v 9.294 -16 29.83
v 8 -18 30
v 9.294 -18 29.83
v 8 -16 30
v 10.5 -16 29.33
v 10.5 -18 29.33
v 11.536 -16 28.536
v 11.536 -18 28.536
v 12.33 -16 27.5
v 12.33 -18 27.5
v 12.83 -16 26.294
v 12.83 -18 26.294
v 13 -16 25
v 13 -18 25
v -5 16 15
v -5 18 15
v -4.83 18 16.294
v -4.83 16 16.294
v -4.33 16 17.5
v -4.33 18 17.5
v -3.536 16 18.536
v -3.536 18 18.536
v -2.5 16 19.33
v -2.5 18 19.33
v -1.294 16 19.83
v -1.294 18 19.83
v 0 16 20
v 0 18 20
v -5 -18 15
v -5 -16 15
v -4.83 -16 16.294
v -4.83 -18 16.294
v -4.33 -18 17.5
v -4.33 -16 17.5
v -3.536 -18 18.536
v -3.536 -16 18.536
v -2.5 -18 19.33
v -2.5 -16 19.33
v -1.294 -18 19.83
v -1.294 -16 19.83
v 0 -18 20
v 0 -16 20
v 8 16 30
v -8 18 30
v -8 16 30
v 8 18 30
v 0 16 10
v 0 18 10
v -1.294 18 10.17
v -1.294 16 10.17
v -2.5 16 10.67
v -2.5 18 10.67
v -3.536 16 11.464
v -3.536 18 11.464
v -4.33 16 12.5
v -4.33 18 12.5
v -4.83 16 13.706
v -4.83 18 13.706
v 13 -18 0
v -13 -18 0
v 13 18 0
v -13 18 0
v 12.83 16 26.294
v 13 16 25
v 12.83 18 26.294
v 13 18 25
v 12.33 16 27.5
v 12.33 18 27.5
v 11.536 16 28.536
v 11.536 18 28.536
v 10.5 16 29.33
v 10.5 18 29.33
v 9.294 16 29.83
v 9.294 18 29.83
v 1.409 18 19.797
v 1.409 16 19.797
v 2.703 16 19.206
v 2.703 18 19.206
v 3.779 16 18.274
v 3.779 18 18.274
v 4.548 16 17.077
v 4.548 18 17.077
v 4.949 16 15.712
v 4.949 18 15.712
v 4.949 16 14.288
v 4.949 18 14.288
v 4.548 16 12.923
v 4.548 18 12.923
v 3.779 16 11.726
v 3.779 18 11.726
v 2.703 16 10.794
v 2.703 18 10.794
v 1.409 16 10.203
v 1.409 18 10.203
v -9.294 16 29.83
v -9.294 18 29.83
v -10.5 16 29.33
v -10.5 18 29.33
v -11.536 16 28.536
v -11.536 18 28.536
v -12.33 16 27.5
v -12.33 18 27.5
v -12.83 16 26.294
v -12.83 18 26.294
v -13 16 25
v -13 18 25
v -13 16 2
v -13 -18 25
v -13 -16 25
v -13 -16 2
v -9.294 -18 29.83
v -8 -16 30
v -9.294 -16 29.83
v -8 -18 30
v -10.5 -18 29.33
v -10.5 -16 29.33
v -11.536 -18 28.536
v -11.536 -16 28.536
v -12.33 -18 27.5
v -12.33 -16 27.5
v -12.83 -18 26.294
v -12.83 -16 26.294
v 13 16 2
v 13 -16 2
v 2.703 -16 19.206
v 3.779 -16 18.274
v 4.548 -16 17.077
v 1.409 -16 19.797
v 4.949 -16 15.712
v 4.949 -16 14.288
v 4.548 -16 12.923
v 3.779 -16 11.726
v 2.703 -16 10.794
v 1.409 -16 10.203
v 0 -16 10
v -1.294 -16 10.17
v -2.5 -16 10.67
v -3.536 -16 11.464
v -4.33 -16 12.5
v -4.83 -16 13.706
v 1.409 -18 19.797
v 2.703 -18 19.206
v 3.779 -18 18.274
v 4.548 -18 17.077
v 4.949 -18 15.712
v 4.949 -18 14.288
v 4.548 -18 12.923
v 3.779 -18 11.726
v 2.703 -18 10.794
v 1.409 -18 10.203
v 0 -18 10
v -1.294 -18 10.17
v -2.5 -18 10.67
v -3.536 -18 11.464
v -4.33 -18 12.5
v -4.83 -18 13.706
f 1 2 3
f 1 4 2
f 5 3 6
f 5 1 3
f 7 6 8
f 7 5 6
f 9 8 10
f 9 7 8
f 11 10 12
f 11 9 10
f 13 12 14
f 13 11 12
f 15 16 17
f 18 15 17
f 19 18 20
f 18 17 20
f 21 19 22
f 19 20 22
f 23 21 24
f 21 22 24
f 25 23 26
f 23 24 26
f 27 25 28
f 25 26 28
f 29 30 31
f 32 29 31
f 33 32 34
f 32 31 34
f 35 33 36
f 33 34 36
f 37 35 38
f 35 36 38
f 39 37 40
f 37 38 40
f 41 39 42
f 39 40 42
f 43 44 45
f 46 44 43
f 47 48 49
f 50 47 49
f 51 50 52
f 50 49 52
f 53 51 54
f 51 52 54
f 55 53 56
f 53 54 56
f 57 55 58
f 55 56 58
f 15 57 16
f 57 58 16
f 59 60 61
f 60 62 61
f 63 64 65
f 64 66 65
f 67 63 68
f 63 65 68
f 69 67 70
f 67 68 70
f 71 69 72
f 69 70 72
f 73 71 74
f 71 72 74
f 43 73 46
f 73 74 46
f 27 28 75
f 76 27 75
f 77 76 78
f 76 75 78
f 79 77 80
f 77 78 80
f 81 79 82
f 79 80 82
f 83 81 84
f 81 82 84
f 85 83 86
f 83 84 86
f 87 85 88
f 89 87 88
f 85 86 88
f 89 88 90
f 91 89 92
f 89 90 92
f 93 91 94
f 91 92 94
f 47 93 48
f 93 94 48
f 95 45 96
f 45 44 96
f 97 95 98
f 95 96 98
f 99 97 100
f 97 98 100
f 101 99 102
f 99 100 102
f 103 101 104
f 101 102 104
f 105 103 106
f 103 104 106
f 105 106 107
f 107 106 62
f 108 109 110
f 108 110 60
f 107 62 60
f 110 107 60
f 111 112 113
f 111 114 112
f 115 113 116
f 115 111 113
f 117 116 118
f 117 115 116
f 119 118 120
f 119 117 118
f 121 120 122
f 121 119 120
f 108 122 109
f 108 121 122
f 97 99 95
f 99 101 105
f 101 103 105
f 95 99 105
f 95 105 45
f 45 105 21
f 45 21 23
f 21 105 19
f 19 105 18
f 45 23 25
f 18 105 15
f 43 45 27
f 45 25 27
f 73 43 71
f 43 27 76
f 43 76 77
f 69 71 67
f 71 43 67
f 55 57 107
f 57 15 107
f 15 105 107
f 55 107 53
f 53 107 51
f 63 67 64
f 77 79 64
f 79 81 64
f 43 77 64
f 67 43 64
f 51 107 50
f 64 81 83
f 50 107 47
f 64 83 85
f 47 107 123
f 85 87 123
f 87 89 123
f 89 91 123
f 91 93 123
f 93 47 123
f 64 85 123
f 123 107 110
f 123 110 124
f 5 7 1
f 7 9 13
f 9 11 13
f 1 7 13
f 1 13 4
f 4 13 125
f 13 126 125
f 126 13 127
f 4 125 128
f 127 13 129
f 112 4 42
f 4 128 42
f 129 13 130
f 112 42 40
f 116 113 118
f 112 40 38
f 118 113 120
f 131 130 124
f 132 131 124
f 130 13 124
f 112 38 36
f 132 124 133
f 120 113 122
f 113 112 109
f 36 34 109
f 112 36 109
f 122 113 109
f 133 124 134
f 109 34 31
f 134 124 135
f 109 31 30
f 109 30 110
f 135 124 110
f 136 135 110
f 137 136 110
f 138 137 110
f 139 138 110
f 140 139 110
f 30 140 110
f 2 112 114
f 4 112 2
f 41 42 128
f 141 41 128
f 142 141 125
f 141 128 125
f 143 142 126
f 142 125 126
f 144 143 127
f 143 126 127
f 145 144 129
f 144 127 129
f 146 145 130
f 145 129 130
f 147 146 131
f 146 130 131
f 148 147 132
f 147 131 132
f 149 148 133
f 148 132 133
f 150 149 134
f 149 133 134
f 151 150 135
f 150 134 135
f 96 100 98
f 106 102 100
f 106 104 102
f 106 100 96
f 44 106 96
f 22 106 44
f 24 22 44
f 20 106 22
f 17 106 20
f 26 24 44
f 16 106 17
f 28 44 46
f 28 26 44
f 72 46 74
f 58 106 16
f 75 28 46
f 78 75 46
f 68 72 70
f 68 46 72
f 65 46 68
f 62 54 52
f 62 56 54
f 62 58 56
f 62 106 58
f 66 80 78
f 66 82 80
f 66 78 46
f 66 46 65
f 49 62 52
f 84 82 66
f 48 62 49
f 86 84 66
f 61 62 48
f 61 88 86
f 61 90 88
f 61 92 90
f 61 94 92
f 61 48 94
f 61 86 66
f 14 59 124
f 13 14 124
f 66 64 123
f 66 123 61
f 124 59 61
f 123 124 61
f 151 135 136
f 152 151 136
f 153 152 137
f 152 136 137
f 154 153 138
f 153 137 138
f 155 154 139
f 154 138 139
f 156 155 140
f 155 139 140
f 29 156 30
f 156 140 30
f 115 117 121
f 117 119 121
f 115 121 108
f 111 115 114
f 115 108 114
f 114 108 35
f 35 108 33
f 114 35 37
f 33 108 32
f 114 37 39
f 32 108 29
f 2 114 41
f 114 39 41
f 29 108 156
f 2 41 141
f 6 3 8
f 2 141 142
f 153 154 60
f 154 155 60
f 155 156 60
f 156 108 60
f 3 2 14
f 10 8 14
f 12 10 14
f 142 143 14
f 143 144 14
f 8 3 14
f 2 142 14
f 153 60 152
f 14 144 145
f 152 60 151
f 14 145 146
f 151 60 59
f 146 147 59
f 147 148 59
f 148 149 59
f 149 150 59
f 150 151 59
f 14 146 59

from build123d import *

# Parameters (mm, degrees)
F0_W     = 26
F0_H     = 2
F1_DEPTH = 30
F0_H_2   = 34
F2_DEPTH = 2
F4_DEPTH = 28
F5_R     = 5
F6_R     = 5
F9_DEPTH = 100


# Not quite as in the source:
# - a feature of the source that left no trace in its solid (it failed there, or was rolled back) is left out


with BuildPart() as f1:
    # F0 (on Top) → F1 (new body)
    with BuildSketch(Plane.XY):
        with Locations((0, 17)):
            Rectangle(F0_W, F0_H)
    extrude(amount=F1_DEPTH)

    # F0 (on Top) → F2 (join)
    with BuildSketch(Plane.XY):
        with Locations((0, -1)):
            Rectangle(F0_W, F0_H_2)
    extrude(amount=F2_DEPTH)

    # F3 (on face) → F4 (join)
    with BuildSketch(Plane.XY.offset(2)):
        Polygon((13, -16), (0, -16), (-13, -16), (-13, -18), (13, -18), align=None)
    extrude(amount=F4_DEPTH)

    # F5
    f5_edges = [f1.edges().sort_by_distance(p)[0] for p in [
        (-13, 17, 30),
        (-13, -17, 30),
    ]]
    fillet(f5_edges, radius=F5_R)

    # F6
    f6_edges = [f1.edges().sort_by_distance(p)[0] for p in [
        (13, 17, 30),
        (13, -17, 30),
    ]]
    fillet(f6_edges, radius=F6_R)

    # F8 (on face) → F9 (cut)
    with BuildSketch(Plane(origin=(0, 18, 0), x_dir=(-1, 0, 0), z_dir=(0, 1, 0))):
        with BuildLine():
            ThreePointArc((5, 15), (3.5355339059, 18.5355339059), (0, 20))
            Line((0, 20), (0, 10))
            ThreePointArc((0, 10), (3.5355339059, 11.4644660941), (5, 15))
        make_face()
        with BuildLine():
            Line((0, 10), (0, 20))
            ThreePointArc((0, 20), (-5, 15), (0, 10))
        make_face()
    extrude(amount=-F9_DEPTH, mode=Mode.SUBTRACT)


solid = f1.part
